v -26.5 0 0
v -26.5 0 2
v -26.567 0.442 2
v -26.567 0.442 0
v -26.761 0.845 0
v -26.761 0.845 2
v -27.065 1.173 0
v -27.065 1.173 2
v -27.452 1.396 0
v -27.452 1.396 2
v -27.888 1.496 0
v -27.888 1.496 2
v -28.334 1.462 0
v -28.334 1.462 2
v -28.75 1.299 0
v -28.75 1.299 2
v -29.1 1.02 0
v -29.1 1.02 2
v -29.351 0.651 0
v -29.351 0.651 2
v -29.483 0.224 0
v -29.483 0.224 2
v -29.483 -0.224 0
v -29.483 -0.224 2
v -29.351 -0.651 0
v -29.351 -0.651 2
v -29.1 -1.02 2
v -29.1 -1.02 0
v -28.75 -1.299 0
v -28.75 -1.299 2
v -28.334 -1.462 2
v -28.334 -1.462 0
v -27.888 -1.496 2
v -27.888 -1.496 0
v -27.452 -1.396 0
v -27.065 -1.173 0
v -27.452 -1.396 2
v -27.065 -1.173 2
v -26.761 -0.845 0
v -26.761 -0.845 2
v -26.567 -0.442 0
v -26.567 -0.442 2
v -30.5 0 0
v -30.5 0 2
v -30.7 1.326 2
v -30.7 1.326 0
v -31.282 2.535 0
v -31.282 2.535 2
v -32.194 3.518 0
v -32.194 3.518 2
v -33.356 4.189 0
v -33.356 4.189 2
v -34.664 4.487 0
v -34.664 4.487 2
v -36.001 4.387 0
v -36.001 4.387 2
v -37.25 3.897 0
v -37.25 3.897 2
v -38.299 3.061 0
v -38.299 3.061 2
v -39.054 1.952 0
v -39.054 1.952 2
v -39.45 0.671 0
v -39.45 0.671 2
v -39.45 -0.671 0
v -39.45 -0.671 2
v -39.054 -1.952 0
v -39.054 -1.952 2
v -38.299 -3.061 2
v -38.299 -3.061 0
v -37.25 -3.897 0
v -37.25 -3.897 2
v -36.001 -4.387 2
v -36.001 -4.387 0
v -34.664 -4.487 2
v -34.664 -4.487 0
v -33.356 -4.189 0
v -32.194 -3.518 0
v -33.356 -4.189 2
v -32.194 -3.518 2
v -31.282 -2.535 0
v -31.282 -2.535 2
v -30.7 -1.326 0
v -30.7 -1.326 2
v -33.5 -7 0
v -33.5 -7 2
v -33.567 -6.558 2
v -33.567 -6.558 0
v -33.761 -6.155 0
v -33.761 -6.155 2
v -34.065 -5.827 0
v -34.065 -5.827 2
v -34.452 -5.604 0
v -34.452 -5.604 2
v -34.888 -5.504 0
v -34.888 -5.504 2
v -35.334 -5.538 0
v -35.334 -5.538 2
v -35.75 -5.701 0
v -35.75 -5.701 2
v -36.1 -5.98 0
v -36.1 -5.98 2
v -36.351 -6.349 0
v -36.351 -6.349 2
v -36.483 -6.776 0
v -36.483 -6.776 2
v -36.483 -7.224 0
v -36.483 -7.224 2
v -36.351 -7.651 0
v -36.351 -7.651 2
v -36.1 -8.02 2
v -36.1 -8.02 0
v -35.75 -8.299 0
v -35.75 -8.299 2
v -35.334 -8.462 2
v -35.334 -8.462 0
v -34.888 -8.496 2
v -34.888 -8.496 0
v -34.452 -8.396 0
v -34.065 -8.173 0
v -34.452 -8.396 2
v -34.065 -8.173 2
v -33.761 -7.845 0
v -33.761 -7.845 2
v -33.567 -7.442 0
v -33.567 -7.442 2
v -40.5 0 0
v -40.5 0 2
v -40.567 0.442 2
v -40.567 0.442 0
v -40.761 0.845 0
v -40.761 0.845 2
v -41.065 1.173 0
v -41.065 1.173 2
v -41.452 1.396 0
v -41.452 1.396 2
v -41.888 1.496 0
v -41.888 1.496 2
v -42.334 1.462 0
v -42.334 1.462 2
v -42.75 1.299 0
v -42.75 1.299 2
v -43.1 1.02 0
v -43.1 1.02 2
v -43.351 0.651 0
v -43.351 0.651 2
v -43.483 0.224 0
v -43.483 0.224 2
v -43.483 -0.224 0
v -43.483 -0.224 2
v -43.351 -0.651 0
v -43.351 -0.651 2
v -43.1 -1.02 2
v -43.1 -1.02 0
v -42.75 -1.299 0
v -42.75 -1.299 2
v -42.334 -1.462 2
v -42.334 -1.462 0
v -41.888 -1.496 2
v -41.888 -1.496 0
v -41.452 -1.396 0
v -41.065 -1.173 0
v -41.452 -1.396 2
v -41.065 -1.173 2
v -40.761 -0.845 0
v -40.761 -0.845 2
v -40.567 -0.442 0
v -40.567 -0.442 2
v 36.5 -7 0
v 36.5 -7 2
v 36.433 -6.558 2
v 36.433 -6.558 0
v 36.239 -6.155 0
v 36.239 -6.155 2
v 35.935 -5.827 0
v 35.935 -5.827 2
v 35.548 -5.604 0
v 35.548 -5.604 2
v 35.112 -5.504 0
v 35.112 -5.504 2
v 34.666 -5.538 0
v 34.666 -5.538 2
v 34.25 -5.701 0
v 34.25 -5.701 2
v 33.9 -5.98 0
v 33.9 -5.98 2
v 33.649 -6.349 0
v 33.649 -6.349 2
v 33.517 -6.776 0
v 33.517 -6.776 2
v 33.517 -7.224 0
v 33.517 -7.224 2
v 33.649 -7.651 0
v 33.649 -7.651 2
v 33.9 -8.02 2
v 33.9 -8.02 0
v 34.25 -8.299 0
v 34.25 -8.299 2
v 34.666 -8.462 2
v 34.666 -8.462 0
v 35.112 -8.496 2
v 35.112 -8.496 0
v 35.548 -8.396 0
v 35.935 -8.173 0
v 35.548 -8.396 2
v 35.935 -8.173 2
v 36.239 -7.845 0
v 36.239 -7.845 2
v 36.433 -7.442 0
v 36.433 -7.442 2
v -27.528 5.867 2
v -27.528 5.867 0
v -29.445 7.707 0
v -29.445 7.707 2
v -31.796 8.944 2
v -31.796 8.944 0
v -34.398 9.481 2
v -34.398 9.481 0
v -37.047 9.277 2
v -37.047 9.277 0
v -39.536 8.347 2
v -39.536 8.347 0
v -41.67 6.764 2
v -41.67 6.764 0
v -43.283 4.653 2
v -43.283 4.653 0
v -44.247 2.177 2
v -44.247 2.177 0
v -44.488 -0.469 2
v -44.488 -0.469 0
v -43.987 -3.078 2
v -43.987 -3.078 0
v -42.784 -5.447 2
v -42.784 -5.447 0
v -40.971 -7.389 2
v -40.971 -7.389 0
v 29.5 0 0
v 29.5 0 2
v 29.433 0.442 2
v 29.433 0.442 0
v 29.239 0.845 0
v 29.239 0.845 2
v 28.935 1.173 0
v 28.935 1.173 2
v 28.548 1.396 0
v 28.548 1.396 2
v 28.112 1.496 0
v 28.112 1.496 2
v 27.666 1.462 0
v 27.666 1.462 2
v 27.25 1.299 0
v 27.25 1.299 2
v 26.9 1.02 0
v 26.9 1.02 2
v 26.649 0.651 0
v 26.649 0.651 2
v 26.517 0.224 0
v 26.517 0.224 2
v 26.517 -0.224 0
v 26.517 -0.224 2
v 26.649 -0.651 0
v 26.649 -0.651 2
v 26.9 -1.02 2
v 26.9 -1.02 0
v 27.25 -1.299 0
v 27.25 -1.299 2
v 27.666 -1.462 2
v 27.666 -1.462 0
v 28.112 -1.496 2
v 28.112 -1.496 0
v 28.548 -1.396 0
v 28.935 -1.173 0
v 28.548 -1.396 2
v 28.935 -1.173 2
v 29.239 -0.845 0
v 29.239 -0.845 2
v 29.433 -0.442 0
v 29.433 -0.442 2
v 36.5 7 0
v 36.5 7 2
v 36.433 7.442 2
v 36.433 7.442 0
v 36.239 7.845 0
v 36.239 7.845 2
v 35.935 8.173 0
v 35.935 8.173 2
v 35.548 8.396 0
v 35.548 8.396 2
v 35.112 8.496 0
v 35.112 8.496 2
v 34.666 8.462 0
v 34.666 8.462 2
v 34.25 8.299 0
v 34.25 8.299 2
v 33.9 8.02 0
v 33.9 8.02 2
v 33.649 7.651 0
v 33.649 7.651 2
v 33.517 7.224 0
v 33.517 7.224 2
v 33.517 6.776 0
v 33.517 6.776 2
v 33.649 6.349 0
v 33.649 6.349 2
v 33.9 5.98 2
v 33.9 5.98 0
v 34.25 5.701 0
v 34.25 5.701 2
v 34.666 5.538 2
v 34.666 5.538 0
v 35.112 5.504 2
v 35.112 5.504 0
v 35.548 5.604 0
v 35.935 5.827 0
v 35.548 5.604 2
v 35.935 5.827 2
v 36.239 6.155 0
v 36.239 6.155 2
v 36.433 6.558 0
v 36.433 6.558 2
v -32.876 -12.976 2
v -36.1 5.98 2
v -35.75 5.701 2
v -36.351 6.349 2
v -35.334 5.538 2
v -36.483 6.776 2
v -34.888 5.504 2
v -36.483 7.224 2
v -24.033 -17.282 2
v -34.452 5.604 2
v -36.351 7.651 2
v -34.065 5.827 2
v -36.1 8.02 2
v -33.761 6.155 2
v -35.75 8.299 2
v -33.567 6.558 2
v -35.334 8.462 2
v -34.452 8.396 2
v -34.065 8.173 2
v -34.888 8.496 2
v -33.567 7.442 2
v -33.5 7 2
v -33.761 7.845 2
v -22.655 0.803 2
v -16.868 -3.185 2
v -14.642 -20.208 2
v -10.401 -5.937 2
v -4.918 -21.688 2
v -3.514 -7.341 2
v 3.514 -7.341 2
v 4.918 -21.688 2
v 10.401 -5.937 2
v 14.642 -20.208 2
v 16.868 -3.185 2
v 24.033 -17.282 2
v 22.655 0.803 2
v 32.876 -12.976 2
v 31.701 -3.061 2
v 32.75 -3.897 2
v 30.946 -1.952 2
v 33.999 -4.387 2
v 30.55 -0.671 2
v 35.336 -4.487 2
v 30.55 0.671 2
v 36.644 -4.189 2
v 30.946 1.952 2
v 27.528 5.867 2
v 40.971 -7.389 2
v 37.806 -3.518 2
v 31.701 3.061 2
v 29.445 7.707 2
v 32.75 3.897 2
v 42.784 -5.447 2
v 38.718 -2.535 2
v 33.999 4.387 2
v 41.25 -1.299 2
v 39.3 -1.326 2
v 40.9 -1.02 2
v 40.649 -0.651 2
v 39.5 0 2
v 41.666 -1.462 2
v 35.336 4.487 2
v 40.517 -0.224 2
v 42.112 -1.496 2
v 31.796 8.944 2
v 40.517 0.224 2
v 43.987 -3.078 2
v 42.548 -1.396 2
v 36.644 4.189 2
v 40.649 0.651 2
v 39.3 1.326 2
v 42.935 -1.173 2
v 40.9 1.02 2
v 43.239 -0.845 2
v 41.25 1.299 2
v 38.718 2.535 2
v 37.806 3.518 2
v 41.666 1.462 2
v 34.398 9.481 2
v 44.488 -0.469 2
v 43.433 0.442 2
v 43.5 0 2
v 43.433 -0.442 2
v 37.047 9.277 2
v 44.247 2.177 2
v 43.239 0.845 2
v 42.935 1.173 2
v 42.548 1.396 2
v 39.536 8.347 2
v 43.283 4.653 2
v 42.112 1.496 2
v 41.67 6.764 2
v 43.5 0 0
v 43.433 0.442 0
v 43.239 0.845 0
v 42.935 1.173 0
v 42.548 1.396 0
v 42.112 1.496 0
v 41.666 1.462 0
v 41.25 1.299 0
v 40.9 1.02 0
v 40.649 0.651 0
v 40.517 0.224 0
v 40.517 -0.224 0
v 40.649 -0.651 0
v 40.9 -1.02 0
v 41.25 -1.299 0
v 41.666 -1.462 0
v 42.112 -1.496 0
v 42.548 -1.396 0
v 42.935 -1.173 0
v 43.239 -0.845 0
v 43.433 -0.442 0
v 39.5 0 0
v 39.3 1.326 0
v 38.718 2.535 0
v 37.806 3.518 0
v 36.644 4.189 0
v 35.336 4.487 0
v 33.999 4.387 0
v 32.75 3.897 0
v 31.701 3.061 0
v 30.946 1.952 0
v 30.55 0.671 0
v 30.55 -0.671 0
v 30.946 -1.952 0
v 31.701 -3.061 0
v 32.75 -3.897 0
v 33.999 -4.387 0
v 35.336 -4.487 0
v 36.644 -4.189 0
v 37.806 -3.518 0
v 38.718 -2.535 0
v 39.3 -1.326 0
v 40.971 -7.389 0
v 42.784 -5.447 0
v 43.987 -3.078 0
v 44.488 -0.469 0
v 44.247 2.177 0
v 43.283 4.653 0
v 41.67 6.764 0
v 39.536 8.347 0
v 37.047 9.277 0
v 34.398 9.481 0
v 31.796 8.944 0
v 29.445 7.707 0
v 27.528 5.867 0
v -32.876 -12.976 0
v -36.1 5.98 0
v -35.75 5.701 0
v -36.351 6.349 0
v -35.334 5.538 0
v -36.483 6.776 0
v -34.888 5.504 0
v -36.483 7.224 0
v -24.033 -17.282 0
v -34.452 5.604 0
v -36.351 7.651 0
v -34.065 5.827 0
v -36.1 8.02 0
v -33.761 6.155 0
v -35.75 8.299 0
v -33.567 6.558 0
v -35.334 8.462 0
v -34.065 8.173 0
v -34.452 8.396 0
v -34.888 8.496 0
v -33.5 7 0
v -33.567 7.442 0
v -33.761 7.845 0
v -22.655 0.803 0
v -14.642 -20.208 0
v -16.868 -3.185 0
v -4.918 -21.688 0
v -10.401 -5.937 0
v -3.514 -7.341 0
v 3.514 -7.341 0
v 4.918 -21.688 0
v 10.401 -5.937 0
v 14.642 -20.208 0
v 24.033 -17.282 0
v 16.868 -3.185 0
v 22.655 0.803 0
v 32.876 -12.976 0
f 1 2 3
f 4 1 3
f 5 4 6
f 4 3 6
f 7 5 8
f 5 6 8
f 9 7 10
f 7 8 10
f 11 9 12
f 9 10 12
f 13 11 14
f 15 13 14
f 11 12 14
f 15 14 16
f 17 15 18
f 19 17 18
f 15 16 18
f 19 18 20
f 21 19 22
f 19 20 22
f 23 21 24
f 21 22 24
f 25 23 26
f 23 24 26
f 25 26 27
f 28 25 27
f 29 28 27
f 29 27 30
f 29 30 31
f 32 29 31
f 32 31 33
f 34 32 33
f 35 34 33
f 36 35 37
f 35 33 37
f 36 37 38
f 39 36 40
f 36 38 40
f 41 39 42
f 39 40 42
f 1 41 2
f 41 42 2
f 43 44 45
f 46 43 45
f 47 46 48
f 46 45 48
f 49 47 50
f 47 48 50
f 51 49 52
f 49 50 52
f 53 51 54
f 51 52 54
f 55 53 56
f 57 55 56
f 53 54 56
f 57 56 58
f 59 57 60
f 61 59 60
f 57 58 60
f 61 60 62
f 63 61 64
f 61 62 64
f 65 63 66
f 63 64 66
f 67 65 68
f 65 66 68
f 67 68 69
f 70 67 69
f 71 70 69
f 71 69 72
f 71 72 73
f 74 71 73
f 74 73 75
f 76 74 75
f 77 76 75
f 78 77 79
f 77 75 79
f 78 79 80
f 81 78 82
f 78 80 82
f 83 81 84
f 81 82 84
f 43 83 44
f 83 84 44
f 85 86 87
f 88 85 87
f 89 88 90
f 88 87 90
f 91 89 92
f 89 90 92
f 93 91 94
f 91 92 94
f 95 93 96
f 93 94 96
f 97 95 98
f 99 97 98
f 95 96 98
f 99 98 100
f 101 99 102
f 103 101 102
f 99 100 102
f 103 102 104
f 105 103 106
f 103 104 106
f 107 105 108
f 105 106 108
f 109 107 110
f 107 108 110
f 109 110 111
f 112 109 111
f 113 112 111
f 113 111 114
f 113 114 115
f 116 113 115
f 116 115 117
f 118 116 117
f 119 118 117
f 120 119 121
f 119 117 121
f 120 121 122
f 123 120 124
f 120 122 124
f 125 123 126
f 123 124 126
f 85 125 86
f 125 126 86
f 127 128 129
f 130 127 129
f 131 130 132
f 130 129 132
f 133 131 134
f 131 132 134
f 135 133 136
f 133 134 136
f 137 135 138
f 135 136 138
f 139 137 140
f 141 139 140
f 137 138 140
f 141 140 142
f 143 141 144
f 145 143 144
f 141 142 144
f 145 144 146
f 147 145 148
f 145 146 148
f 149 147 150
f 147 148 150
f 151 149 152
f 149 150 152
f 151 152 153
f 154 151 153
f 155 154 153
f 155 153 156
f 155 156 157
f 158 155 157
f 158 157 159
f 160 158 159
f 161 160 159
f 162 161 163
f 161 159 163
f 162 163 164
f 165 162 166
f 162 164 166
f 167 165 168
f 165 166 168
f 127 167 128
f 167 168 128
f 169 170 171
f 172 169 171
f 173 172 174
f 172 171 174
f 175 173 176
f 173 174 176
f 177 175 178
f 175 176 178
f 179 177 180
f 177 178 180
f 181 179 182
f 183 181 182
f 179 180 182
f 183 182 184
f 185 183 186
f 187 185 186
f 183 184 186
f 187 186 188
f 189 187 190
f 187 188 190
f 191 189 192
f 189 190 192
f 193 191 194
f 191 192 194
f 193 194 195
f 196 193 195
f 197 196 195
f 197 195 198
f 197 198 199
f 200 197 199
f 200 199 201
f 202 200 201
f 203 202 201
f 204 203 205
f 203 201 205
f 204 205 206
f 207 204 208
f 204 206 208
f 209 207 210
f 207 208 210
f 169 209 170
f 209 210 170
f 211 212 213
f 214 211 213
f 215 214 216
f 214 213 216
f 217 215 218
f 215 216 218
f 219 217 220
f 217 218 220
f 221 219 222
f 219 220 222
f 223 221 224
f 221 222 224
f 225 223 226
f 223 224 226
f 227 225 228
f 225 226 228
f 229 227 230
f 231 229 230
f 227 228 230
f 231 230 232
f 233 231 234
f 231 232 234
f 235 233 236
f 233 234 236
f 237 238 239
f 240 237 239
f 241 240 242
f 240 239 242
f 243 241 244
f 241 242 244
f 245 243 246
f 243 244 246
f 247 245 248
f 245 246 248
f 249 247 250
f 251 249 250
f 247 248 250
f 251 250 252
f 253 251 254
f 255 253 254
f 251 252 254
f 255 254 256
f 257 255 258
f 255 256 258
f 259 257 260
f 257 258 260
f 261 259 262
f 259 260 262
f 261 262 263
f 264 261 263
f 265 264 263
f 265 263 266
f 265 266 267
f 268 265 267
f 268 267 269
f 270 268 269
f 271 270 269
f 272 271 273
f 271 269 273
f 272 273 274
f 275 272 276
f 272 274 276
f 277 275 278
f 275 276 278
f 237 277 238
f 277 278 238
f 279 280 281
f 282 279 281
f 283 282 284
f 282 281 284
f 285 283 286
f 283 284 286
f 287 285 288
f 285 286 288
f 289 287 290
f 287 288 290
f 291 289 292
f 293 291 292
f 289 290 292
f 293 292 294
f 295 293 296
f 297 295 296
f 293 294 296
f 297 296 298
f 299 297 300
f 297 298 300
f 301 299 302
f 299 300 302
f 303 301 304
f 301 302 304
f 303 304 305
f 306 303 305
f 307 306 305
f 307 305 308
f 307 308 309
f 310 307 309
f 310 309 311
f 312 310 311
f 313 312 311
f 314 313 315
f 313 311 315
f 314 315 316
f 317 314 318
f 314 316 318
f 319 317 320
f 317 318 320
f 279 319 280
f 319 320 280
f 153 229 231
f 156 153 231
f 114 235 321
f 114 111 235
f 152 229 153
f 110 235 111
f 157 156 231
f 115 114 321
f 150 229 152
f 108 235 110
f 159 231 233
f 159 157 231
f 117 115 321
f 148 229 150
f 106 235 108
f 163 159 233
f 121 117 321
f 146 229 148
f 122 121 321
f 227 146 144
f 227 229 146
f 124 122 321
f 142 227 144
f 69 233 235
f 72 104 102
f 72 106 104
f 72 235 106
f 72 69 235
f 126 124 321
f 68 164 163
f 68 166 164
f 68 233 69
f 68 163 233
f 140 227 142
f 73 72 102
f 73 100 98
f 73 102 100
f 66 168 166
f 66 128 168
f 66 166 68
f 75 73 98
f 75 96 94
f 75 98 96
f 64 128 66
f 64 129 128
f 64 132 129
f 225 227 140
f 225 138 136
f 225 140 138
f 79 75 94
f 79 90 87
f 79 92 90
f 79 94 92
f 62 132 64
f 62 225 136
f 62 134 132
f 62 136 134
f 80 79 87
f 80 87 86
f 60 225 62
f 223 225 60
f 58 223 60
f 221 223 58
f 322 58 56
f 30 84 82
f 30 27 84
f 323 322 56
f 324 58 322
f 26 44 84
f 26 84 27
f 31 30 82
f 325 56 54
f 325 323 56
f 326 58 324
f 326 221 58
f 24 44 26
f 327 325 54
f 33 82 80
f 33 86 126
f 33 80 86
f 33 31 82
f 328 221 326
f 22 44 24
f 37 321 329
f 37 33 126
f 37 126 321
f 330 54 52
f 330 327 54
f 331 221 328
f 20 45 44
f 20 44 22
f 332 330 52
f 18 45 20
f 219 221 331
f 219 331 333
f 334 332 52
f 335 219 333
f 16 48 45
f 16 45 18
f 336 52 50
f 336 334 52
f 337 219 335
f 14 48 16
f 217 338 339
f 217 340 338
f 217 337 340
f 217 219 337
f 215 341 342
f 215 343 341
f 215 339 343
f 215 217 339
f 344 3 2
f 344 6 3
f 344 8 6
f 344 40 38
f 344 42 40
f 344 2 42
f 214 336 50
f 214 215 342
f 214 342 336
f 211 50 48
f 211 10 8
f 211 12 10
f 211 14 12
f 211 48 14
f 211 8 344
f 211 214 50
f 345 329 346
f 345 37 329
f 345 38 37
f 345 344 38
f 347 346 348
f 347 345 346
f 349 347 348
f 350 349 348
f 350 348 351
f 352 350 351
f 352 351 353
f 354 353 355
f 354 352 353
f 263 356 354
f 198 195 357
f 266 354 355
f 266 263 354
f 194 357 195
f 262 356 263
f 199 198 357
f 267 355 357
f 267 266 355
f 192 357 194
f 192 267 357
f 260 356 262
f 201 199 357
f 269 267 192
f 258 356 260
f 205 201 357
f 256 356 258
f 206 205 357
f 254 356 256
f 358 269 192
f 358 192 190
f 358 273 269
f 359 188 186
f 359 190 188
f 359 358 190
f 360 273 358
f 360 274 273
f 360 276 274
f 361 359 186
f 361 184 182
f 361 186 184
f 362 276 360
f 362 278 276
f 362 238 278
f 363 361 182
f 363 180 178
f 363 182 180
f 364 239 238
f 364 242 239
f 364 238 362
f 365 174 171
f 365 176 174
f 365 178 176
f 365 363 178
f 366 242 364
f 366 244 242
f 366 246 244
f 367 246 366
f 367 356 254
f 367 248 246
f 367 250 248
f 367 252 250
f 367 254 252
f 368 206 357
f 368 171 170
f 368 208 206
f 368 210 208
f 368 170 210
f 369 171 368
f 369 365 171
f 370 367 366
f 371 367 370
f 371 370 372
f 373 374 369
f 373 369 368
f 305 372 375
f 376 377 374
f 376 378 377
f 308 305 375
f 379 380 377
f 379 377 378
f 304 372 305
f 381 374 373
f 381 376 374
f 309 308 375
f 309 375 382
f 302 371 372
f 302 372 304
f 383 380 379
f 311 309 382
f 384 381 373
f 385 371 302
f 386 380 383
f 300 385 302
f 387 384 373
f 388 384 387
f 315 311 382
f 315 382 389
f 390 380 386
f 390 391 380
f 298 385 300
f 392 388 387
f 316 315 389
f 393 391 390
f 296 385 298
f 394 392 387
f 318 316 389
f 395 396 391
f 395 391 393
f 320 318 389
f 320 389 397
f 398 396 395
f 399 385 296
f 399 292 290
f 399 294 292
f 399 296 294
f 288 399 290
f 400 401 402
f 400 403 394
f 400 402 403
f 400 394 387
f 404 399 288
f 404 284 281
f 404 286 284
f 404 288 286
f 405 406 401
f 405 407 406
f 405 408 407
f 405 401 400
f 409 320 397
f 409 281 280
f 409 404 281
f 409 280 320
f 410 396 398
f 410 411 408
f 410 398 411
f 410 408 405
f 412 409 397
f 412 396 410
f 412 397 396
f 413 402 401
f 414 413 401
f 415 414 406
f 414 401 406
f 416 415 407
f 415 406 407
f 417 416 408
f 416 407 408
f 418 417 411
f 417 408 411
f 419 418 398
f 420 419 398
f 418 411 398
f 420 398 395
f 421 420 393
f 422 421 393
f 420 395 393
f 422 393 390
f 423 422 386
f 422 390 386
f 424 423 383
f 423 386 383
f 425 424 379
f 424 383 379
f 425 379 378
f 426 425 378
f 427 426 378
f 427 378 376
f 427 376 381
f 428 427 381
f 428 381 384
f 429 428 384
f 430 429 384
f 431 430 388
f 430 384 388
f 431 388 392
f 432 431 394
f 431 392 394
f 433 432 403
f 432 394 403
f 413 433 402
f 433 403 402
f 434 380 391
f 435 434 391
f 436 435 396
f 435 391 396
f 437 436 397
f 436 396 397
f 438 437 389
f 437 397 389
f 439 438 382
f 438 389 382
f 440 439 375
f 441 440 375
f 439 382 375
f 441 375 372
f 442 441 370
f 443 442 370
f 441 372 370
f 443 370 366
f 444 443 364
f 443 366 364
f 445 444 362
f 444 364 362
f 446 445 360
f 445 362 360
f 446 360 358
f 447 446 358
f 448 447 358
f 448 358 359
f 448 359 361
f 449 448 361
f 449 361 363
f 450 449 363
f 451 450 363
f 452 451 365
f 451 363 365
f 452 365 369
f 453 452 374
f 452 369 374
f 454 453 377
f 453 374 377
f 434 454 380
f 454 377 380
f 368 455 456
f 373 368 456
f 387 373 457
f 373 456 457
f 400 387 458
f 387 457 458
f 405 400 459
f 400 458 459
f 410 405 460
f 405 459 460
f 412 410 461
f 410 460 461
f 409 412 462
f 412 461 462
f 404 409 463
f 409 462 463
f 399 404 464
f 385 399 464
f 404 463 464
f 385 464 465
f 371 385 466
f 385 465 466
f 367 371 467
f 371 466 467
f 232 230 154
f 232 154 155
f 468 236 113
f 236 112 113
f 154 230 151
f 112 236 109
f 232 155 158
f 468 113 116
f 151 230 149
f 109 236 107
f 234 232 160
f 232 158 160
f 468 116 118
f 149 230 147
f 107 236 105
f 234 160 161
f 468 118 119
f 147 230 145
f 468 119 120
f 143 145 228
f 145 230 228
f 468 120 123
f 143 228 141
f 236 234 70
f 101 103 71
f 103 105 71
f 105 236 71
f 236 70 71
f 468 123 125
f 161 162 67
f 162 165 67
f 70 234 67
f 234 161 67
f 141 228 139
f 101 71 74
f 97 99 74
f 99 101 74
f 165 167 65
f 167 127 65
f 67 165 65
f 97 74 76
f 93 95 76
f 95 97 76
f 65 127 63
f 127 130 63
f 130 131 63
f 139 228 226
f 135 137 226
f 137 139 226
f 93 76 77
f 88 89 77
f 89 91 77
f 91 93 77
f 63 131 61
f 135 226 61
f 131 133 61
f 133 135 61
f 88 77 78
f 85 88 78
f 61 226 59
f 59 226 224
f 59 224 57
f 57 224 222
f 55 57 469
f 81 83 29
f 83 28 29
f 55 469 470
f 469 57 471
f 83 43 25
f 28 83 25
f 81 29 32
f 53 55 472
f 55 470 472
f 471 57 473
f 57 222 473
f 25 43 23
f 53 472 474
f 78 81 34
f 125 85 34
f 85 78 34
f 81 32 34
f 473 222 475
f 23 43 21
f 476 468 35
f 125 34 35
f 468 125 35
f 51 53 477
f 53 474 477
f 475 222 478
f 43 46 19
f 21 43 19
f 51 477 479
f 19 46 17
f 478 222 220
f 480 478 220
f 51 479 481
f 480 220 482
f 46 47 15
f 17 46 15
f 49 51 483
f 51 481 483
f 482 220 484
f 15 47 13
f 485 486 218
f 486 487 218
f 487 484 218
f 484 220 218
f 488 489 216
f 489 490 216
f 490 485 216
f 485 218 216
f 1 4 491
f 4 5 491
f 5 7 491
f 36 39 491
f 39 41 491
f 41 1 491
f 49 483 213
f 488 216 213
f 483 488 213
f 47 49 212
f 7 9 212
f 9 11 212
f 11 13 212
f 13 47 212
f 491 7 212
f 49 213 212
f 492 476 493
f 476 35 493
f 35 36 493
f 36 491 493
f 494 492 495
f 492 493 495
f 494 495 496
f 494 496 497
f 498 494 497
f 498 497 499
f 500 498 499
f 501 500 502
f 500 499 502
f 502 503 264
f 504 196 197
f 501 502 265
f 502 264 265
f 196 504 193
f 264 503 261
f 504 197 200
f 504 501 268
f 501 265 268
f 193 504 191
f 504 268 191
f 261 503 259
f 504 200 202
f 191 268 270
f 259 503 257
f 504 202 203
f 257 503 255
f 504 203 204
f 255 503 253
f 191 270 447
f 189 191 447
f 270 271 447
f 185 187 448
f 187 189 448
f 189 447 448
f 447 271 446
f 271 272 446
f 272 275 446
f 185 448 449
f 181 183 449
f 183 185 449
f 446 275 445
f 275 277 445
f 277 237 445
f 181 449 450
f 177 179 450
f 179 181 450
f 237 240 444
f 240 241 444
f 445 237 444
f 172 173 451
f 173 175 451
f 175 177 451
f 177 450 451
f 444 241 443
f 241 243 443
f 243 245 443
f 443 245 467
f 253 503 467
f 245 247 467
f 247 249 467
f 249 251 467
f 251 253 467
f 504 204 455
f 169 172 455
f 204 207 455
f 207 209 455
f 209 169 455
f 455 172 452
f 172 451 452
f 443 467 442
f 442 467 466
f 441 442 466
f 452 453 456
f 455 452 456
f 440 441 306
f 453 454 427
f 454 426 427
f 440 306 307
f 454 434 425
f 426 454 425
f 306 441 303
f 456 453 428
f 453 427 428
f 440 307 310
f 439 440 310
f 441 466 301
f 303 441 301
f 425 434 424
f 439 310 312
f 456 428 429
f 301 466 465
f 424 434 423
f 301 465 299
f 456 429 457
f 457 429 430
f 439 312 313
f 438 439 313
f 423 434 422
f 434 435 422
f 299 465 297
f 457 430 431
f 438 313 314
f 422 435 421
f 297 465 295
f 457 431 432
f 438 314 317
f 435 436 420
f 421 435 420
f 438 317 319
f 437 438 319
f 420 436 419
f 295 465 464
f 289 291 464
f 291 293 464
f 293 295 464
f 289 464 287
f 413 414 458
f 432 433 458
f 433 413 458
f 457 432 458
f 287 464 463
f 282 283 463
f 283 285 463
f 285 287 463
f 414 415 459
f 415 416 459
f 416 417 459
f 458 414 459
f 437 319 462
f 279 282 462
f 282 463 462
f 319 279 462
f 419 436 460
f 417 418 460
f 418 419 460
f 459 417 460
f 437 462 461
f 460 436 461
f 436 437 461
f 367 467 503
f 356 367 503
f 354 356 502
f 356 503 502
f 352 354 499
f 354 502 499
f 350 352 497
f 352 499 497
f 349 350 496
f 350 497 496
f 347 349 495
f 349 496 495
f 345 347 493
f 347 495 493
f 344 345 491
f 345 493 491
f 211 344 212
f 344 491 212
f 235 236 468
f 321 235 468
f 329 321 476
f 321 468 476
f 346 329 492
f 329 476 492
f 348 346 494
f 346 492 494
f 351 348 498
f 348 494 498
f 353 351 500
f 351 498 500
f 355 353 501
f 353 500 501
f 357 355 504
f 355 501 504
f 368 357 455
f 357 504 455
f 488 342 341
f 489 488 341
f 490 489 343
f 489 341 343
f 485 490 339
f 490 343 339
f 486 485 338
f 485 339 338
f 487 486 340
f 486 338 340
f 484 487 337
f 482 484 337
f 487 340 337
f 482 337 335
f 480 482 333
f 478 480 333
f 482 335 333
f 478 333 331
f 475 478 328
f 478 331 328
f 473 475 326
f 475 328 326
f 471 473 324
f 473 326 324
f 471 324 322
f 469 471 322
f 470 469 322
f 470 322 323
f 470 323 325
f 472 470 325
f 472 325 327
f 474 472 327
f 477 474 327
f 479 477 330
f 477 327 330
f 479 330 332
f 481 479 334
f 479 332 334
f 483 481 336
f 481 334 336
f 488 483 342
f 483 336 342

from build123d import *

# Parameters (mm, degrees)
EXTRUDE_1_DEPTH     = 2
SKETCH_2_R          = 4.5
SKETCH_2_R_2        = 1.5
CUT_EXTRUDE_1_DEPTH = 2


with BuildPart() as part:
    # 草图1 → 凸台-拉伸1 (new body)
    with BuildSketch(Plane.XY):
        with BuildLine():
            ThreePointArc((-27.528089888, 5.866903721), (-41.670339741, 6.764360114), (-40.970905632, -7.389065295))
            ThreePointArc((-40.970905632, -7.389065295), (0, -21.87378703), (40.970905632, -7.389065295))
            ThreePointArc((40.970905632, -7.389065295), (41.670339741, 6.764360114), (27.528089888, 5.866903721))
            ThreePointArc((27.528089888, 5.866903721), (0, -7.518187833), (-27.528089888, 5.866903721))
        make_face()
    extrude(amount=EXTRUDE_1_DEPTH)

    # 草图2 → 切除-拉伸1 (cut)
    with BuildSketch(Plane.XY.offset(2)):
        with Locations((35, 0)):
            Circle(SKETCH_2_R)
        with Locations((-35, 0)):
            Circle(SKETCH_2_R)
        with Locations((-28, 0)):
            Circle(SKETCH_2_R_2)
        with Locations((-35, -7)):
            Circle(SKETCH_2_R_2)
        with Locations((-42, 0)):
            Circle(SKETCH_2_R_2)
        with Locations((-35, 7)):
            Circle(SKETCH_2_R_2)
        with Locations((28, 0)):
            Circle(SKETCH_2_R_2)
        with Locations((35, 7)):
            Circle(SKETCH_2_R_2)
        with Locations((42, 0)):
            Circle(SKETCH_2_R_2)
        with Locations((35, -7)):
            Circle(SKETCH_2_R_2)
    extrude(amount=-CUT_EXTRUDE_1_DEPTH, mode=Mode.SUBTRACT)


solid = part.part
